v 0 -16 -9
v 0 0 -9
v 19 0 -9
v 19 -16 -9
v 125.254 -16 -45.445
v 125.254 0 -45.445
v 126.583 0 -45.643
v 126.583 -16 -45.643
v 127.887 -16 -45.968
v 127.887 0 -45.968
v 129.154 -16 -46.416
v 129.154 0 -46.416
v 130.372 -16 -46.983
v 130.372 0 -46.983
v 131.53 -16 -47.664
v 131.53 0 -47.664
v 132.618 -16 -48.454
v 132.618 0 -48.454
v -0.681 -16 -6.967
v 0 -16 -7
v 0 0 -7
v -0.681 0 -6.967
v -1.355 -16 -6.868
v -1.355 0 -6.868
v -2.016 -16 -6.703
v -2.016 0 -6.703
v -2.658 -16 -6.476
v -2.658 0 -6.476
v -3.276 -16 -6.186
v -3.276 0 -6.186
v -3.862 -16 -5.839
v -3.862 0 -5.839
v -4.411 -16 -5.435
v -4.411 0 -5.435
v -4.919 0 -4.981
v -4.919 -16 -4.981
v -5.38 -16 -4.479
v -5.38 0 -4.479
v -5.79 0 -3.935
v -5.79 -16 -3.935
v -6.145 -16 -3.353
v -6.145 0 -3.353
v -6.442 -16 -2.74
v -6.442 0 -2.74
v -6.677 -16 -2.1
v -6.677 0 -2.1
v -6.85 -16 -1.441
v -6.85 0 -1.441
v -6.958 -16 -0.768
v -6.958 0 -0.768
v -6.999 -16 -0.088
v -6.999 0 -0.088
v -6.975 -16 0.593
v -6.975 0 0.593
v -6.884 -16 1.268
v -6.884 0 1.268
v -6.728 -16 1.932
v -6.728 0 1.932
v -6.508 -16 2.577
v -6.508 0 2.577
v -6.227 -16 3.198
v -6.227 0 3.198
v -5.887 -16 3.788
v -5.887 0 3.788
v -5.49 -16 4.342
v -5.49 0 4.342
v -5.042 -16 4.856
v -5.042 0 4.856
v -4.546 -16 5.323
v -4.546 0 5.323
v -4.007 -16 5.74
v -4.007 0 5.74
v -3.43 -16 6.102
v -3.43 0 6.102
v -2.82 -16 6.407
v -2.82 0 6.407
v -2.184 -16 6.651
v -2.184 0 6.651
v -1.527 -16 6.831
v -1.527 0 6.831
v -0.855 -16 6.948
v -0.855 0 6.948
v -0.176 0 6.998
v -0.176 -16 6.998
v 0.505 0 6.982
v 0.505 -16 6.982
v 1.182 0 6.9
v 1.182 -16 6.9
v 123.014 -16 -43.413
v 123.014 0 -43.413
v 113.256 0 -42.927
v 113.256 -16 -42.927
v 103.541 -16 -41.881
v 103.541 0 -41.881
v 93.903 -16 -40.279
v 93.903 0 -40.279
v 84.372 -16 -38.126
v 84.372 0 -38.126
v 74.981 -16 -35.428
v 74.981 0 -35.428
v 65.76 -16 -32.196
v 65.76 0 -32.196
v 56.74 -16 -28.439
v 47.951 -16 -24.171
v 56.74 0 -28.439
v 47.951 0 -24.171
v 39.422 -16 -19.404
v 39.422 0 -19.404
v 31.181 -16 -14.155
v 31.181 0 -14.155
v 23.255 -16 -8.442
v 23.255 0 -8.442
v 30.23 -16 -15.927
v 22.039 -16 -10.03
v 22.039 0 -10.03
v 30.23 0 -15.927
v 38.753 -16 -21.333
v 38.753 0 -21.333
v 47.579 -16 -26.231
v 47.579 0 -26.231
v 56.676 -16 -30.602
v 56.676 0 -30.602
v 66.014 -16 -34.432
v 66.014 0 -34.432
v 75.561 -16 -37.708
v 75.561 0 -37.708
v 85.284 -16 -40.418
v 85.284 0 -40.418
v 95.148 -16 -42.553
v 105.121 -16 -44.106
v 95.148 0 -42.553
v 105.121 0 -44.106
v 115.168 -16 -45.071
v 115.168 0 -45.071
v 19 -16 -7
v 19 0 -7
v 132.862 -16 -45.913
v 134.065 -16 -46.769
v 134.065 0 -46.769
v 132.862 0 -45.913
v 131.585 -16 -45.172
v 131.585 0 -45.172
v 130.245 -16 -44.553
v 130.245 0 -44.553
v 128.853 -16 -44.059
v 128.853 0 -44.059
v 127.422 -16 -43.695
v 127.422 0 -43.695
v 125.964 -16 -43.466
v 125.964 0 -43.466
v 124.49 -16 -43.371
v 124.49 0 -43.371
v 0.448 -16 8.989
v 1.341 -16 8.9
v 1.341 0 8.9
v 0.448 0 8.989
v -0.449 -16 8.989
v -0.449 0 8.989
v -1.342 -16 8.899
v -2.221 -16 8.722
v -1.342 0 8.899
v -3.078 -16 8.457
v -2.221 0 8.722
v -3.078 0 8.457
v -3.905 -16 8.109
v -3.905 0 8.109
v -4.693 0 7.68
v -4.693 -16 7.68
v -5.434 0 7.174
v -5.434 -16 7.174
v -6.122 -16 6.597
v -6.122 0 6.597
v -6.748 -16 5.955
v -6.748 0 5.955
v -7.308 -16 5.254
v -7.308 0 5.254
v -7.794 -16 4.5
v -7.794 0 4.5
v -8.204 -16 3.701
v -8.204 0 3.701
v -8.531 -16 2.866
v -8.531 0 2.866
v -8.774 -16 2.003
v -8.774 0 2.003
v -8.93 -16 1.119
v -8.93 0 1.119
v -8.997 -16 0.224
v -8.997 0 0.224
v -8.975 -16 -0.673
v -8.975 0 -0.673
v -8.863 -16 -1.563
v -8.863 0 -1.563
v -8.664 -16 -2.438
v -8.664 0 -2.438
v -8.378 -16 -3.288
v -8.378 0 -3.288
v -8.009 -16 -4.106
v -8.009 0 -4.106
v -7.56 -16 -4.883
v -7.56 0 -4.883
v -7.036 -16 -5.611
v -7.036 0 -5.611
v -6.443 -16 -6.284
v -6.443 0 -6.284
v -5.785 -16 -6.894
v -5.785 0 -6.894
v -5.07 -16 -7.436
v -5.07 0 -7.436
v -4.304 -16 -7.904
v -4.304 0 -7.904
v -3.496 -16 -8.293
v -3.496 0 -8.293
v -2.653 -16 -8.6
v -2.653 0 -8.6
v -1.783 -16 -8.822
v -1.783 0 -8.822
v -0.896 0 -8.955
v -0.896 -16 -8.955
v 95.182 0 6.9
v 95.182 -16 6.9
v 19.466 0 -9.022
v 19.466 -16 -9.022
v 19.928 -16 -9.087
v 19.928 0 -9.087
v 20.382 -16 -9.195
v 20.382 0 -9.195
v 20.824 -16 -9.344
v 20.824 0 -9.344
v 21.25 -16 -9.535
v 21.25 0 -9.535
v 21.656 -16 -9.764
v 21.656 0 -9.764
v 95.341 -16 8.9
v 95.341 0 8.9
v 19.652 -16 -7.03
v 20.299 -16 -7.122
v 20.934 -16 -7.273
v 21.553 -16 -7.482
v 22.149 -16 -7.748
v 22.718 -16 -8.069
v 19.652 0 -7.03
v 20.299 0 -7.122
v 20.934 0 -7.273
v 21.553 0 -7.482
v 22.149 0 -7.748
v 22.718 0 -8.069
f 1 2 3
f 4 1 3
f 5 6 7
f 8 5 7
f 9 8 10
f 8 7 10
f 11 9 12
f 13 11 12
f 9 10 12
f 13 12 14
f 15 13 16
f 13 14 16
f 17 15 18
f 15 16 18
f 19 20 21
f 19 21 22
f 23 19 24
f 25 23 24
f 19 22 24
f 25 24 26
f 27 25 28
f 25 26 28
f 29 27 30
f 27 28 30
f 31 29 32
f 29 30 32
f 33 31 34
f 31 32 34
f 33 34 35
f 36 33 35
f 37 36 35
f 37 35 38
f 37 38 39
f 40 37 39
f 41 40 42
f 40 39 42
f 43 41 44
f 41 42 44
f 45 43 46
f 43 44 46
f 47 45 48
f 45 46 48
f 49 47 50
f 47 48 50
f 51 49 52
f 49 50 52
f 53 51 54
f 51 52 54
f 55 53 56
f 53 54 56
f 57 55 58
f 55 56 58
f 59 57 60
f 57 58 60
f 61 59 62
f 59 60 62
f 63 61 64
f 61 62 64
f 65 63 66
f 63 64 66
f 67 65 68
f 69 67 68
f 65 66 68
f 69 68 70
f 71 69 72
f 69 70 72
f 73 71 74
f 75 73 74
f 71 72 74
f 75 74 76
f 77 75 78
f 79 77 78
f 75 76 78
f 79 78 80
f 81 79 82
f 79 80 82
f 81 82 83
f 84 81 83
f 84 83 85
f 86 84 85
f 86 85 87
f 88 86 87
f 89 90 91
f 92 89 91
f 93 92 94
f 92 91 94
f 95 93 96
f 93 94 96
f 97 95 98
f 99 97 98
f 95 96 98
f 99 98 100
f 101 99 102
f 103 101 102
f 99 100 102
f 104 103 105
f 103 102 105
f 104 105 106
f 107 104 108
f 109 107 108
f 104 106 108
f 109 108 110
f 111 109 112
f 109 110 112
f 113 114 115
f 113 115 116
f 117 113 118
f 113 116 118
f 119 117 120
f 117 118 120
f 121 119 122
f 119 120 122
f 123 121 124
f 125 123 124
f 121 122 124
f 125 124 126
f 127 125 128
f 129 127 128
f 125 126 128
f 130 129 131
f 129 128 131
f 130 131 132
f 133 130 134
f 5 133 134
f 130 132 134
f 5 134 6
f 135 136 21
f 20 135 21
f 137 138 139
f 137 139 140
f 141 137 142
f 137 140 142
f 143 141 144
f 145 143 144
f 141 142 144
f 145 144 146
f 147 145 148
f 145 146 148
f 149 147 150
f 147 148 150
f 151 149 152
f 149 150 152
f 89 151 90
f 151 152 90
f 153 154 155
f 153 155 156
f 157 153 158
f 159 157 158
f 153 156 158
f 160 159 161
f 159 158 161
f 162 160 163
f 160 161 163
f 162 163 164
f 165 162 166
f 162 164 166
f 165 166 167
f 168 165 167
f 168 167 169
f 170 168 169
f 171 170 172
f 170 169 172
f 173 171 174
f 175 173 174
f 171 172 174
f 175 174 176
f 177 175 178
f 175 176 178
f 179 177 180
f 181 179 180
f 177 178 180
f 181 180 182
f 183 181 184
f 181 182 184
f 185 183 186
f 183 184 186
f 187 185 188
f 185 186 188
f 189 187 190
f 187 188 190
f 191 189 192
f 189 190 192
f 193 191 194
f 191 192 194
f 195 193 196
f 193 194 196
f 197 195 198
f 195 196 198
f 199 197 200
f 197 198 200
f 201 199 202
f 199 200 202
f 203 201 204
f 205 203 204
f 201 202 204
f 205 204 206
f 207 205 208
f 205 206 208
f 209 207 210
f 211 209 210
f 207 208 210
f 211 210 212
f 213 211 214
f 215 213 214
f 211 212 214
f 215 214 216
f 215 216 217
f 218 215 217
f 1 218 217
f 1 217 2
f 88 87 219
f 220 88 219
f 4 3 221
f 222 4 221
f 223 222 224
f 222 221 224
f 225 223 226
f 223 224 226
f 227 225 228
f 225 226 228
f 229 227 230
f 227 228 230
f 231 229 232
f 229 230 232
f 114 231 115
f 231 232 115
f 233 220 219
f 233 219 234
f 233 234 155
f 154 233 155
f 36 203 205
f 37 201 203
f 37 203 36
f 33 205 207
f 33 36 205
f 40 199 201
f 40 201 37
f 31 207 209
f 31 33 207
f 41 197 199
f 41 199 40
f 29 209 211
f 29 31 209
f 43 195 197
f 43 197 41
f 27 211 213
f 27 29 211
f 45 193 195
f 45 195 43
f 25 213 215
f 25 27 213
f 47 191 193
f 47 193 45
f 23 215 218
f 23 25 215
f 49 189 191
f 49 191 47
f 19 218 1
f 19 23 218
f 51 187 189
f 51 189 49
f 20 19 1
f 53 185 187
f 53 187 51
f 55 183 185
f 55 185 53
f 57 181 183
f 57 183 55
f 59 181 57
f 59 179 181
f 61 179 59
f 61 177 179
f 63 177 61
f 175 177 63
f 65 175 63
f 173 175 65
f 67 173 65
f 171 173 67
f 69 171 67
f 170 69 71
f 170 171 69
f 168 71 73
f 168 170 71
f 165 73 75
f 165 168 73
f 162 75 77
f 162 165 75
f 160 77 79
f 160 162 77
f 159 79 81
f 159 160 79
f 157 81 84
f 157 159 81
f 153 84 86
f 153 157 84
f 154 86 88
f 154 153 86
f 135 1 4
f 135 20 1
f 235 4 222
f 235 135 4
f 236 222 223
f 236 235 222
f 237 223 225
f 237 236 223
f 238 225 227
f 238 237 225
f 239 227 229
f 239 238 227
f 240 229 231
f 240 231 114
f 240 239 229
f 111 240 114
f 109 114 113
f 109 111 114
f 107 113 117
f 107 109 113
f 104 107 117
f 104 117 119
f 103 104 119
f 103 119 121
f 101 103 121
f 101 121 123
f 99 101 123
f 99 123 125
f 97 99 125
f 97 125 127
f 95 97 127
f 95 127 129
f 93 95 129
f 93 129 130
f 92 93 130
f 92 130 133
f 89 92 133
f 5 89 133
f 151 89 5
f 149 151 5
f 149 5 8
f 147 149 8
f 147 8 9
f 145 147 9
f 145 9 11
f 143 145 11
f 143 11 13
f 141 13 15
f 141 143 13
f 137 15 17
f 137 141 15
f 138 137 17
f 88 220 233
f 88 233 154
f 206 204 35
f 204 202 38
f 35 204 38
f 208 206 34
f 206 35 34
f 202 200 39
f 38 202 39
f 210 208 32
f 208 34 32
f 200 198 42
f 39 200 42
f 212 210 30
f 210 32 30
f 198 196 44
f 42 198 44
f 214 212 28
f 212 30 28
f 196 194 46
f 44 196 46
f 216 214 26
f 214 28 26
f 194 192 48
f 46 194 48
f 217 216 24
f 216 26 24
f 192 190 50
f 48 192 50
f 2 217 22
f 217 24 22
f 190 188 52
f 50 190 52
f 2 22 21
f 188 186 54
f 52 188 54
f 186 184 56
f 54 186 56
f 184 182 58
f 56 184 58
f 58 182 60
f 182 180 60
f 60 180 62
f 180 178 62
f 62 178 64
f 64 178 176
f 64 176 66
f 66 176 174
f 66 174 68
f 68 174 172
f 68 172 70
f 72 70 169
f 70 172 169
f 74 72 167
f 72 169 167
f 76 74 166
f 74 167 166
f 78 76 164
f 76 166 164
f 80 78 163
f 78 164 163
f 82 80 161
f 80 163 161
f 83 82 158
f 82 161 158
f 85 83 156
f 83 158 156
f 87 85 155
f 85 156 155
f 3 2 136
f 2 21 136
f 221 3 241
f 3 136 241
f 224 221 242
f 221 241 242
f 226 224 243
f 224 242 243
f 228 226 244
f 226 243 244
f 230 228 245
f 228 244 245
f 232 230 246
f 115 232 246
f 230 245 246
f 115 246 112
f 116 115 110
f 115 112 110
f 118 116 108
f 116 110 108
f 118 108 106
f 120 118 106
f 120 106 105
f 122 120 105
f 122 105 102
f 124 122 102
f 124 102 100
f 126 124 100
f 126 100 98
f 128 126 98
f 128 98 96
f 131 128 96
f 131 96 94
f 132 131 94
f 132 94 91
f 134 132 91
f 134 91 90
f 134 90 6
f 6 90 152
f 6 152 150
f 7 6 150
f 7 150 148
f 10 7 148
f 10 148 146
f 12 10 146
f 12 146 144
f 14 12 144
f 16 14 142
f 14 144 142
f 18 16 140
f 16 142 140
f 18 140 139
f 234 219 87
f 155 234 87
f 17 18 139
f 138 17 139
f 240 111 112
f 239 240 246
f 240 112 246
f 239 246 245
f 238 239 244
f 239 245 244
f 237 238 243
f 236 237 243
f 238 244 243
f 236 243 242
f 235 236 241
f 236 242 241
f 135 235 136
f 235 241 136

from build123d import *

# Parameters (mm, degrees)
F1_DEPTH = 16


with BuildPart() as f1:
    # F0 (on Front) → F1 (new body)
    with BuildSketch(Plane.XZ):
        with BuildLine():
            Line((95.341194, 8.899506), (1.341194, 8.899506))
            ThreePointArc((1.341194, 8.899506), (-8.974841, 0.672477), (0, -9))
            Line((0, -9), (19, -9))
            ThreePointArc((19, -9), (20.604423, -9.264409), (22.039157, -10.02967))
            ThreePointArc((22.039157, -10.02967), (70.763703, -36.139738), (125.254312, -45.445144))
            ThreePointArc((125.254312, -45.445144), (129.154135, -46.415554), (132.617611, -48.45385))
            Line((132.617611, -48.45385), (134.065223, -46.76863))
            ThreePointArc((134.065223, -46.76863), (128.853194, -44.058853), (123.014468, -43.412776))
            ThreePointArc((123.014468, -43.412776), (70.347282, -33.878442), (23.25482, -8.441537))
            ThreePointArc((23.25482, -8.441537), (21.246192, -7.370172), (19, -7))
            Line((19, -7), (0, -7))
            ThreePointArc((0, -7), (-6.974831, 0.593069), (1.181873, 6.899506))
            Line((1.181873, 6.899506), (95.181873, 6.899506))
            Line((95.181873, 6.899506), (95.341194, 8.899506))
        make_face()
    extrude(amount=F1_DEPTH)


solid = f1.part
